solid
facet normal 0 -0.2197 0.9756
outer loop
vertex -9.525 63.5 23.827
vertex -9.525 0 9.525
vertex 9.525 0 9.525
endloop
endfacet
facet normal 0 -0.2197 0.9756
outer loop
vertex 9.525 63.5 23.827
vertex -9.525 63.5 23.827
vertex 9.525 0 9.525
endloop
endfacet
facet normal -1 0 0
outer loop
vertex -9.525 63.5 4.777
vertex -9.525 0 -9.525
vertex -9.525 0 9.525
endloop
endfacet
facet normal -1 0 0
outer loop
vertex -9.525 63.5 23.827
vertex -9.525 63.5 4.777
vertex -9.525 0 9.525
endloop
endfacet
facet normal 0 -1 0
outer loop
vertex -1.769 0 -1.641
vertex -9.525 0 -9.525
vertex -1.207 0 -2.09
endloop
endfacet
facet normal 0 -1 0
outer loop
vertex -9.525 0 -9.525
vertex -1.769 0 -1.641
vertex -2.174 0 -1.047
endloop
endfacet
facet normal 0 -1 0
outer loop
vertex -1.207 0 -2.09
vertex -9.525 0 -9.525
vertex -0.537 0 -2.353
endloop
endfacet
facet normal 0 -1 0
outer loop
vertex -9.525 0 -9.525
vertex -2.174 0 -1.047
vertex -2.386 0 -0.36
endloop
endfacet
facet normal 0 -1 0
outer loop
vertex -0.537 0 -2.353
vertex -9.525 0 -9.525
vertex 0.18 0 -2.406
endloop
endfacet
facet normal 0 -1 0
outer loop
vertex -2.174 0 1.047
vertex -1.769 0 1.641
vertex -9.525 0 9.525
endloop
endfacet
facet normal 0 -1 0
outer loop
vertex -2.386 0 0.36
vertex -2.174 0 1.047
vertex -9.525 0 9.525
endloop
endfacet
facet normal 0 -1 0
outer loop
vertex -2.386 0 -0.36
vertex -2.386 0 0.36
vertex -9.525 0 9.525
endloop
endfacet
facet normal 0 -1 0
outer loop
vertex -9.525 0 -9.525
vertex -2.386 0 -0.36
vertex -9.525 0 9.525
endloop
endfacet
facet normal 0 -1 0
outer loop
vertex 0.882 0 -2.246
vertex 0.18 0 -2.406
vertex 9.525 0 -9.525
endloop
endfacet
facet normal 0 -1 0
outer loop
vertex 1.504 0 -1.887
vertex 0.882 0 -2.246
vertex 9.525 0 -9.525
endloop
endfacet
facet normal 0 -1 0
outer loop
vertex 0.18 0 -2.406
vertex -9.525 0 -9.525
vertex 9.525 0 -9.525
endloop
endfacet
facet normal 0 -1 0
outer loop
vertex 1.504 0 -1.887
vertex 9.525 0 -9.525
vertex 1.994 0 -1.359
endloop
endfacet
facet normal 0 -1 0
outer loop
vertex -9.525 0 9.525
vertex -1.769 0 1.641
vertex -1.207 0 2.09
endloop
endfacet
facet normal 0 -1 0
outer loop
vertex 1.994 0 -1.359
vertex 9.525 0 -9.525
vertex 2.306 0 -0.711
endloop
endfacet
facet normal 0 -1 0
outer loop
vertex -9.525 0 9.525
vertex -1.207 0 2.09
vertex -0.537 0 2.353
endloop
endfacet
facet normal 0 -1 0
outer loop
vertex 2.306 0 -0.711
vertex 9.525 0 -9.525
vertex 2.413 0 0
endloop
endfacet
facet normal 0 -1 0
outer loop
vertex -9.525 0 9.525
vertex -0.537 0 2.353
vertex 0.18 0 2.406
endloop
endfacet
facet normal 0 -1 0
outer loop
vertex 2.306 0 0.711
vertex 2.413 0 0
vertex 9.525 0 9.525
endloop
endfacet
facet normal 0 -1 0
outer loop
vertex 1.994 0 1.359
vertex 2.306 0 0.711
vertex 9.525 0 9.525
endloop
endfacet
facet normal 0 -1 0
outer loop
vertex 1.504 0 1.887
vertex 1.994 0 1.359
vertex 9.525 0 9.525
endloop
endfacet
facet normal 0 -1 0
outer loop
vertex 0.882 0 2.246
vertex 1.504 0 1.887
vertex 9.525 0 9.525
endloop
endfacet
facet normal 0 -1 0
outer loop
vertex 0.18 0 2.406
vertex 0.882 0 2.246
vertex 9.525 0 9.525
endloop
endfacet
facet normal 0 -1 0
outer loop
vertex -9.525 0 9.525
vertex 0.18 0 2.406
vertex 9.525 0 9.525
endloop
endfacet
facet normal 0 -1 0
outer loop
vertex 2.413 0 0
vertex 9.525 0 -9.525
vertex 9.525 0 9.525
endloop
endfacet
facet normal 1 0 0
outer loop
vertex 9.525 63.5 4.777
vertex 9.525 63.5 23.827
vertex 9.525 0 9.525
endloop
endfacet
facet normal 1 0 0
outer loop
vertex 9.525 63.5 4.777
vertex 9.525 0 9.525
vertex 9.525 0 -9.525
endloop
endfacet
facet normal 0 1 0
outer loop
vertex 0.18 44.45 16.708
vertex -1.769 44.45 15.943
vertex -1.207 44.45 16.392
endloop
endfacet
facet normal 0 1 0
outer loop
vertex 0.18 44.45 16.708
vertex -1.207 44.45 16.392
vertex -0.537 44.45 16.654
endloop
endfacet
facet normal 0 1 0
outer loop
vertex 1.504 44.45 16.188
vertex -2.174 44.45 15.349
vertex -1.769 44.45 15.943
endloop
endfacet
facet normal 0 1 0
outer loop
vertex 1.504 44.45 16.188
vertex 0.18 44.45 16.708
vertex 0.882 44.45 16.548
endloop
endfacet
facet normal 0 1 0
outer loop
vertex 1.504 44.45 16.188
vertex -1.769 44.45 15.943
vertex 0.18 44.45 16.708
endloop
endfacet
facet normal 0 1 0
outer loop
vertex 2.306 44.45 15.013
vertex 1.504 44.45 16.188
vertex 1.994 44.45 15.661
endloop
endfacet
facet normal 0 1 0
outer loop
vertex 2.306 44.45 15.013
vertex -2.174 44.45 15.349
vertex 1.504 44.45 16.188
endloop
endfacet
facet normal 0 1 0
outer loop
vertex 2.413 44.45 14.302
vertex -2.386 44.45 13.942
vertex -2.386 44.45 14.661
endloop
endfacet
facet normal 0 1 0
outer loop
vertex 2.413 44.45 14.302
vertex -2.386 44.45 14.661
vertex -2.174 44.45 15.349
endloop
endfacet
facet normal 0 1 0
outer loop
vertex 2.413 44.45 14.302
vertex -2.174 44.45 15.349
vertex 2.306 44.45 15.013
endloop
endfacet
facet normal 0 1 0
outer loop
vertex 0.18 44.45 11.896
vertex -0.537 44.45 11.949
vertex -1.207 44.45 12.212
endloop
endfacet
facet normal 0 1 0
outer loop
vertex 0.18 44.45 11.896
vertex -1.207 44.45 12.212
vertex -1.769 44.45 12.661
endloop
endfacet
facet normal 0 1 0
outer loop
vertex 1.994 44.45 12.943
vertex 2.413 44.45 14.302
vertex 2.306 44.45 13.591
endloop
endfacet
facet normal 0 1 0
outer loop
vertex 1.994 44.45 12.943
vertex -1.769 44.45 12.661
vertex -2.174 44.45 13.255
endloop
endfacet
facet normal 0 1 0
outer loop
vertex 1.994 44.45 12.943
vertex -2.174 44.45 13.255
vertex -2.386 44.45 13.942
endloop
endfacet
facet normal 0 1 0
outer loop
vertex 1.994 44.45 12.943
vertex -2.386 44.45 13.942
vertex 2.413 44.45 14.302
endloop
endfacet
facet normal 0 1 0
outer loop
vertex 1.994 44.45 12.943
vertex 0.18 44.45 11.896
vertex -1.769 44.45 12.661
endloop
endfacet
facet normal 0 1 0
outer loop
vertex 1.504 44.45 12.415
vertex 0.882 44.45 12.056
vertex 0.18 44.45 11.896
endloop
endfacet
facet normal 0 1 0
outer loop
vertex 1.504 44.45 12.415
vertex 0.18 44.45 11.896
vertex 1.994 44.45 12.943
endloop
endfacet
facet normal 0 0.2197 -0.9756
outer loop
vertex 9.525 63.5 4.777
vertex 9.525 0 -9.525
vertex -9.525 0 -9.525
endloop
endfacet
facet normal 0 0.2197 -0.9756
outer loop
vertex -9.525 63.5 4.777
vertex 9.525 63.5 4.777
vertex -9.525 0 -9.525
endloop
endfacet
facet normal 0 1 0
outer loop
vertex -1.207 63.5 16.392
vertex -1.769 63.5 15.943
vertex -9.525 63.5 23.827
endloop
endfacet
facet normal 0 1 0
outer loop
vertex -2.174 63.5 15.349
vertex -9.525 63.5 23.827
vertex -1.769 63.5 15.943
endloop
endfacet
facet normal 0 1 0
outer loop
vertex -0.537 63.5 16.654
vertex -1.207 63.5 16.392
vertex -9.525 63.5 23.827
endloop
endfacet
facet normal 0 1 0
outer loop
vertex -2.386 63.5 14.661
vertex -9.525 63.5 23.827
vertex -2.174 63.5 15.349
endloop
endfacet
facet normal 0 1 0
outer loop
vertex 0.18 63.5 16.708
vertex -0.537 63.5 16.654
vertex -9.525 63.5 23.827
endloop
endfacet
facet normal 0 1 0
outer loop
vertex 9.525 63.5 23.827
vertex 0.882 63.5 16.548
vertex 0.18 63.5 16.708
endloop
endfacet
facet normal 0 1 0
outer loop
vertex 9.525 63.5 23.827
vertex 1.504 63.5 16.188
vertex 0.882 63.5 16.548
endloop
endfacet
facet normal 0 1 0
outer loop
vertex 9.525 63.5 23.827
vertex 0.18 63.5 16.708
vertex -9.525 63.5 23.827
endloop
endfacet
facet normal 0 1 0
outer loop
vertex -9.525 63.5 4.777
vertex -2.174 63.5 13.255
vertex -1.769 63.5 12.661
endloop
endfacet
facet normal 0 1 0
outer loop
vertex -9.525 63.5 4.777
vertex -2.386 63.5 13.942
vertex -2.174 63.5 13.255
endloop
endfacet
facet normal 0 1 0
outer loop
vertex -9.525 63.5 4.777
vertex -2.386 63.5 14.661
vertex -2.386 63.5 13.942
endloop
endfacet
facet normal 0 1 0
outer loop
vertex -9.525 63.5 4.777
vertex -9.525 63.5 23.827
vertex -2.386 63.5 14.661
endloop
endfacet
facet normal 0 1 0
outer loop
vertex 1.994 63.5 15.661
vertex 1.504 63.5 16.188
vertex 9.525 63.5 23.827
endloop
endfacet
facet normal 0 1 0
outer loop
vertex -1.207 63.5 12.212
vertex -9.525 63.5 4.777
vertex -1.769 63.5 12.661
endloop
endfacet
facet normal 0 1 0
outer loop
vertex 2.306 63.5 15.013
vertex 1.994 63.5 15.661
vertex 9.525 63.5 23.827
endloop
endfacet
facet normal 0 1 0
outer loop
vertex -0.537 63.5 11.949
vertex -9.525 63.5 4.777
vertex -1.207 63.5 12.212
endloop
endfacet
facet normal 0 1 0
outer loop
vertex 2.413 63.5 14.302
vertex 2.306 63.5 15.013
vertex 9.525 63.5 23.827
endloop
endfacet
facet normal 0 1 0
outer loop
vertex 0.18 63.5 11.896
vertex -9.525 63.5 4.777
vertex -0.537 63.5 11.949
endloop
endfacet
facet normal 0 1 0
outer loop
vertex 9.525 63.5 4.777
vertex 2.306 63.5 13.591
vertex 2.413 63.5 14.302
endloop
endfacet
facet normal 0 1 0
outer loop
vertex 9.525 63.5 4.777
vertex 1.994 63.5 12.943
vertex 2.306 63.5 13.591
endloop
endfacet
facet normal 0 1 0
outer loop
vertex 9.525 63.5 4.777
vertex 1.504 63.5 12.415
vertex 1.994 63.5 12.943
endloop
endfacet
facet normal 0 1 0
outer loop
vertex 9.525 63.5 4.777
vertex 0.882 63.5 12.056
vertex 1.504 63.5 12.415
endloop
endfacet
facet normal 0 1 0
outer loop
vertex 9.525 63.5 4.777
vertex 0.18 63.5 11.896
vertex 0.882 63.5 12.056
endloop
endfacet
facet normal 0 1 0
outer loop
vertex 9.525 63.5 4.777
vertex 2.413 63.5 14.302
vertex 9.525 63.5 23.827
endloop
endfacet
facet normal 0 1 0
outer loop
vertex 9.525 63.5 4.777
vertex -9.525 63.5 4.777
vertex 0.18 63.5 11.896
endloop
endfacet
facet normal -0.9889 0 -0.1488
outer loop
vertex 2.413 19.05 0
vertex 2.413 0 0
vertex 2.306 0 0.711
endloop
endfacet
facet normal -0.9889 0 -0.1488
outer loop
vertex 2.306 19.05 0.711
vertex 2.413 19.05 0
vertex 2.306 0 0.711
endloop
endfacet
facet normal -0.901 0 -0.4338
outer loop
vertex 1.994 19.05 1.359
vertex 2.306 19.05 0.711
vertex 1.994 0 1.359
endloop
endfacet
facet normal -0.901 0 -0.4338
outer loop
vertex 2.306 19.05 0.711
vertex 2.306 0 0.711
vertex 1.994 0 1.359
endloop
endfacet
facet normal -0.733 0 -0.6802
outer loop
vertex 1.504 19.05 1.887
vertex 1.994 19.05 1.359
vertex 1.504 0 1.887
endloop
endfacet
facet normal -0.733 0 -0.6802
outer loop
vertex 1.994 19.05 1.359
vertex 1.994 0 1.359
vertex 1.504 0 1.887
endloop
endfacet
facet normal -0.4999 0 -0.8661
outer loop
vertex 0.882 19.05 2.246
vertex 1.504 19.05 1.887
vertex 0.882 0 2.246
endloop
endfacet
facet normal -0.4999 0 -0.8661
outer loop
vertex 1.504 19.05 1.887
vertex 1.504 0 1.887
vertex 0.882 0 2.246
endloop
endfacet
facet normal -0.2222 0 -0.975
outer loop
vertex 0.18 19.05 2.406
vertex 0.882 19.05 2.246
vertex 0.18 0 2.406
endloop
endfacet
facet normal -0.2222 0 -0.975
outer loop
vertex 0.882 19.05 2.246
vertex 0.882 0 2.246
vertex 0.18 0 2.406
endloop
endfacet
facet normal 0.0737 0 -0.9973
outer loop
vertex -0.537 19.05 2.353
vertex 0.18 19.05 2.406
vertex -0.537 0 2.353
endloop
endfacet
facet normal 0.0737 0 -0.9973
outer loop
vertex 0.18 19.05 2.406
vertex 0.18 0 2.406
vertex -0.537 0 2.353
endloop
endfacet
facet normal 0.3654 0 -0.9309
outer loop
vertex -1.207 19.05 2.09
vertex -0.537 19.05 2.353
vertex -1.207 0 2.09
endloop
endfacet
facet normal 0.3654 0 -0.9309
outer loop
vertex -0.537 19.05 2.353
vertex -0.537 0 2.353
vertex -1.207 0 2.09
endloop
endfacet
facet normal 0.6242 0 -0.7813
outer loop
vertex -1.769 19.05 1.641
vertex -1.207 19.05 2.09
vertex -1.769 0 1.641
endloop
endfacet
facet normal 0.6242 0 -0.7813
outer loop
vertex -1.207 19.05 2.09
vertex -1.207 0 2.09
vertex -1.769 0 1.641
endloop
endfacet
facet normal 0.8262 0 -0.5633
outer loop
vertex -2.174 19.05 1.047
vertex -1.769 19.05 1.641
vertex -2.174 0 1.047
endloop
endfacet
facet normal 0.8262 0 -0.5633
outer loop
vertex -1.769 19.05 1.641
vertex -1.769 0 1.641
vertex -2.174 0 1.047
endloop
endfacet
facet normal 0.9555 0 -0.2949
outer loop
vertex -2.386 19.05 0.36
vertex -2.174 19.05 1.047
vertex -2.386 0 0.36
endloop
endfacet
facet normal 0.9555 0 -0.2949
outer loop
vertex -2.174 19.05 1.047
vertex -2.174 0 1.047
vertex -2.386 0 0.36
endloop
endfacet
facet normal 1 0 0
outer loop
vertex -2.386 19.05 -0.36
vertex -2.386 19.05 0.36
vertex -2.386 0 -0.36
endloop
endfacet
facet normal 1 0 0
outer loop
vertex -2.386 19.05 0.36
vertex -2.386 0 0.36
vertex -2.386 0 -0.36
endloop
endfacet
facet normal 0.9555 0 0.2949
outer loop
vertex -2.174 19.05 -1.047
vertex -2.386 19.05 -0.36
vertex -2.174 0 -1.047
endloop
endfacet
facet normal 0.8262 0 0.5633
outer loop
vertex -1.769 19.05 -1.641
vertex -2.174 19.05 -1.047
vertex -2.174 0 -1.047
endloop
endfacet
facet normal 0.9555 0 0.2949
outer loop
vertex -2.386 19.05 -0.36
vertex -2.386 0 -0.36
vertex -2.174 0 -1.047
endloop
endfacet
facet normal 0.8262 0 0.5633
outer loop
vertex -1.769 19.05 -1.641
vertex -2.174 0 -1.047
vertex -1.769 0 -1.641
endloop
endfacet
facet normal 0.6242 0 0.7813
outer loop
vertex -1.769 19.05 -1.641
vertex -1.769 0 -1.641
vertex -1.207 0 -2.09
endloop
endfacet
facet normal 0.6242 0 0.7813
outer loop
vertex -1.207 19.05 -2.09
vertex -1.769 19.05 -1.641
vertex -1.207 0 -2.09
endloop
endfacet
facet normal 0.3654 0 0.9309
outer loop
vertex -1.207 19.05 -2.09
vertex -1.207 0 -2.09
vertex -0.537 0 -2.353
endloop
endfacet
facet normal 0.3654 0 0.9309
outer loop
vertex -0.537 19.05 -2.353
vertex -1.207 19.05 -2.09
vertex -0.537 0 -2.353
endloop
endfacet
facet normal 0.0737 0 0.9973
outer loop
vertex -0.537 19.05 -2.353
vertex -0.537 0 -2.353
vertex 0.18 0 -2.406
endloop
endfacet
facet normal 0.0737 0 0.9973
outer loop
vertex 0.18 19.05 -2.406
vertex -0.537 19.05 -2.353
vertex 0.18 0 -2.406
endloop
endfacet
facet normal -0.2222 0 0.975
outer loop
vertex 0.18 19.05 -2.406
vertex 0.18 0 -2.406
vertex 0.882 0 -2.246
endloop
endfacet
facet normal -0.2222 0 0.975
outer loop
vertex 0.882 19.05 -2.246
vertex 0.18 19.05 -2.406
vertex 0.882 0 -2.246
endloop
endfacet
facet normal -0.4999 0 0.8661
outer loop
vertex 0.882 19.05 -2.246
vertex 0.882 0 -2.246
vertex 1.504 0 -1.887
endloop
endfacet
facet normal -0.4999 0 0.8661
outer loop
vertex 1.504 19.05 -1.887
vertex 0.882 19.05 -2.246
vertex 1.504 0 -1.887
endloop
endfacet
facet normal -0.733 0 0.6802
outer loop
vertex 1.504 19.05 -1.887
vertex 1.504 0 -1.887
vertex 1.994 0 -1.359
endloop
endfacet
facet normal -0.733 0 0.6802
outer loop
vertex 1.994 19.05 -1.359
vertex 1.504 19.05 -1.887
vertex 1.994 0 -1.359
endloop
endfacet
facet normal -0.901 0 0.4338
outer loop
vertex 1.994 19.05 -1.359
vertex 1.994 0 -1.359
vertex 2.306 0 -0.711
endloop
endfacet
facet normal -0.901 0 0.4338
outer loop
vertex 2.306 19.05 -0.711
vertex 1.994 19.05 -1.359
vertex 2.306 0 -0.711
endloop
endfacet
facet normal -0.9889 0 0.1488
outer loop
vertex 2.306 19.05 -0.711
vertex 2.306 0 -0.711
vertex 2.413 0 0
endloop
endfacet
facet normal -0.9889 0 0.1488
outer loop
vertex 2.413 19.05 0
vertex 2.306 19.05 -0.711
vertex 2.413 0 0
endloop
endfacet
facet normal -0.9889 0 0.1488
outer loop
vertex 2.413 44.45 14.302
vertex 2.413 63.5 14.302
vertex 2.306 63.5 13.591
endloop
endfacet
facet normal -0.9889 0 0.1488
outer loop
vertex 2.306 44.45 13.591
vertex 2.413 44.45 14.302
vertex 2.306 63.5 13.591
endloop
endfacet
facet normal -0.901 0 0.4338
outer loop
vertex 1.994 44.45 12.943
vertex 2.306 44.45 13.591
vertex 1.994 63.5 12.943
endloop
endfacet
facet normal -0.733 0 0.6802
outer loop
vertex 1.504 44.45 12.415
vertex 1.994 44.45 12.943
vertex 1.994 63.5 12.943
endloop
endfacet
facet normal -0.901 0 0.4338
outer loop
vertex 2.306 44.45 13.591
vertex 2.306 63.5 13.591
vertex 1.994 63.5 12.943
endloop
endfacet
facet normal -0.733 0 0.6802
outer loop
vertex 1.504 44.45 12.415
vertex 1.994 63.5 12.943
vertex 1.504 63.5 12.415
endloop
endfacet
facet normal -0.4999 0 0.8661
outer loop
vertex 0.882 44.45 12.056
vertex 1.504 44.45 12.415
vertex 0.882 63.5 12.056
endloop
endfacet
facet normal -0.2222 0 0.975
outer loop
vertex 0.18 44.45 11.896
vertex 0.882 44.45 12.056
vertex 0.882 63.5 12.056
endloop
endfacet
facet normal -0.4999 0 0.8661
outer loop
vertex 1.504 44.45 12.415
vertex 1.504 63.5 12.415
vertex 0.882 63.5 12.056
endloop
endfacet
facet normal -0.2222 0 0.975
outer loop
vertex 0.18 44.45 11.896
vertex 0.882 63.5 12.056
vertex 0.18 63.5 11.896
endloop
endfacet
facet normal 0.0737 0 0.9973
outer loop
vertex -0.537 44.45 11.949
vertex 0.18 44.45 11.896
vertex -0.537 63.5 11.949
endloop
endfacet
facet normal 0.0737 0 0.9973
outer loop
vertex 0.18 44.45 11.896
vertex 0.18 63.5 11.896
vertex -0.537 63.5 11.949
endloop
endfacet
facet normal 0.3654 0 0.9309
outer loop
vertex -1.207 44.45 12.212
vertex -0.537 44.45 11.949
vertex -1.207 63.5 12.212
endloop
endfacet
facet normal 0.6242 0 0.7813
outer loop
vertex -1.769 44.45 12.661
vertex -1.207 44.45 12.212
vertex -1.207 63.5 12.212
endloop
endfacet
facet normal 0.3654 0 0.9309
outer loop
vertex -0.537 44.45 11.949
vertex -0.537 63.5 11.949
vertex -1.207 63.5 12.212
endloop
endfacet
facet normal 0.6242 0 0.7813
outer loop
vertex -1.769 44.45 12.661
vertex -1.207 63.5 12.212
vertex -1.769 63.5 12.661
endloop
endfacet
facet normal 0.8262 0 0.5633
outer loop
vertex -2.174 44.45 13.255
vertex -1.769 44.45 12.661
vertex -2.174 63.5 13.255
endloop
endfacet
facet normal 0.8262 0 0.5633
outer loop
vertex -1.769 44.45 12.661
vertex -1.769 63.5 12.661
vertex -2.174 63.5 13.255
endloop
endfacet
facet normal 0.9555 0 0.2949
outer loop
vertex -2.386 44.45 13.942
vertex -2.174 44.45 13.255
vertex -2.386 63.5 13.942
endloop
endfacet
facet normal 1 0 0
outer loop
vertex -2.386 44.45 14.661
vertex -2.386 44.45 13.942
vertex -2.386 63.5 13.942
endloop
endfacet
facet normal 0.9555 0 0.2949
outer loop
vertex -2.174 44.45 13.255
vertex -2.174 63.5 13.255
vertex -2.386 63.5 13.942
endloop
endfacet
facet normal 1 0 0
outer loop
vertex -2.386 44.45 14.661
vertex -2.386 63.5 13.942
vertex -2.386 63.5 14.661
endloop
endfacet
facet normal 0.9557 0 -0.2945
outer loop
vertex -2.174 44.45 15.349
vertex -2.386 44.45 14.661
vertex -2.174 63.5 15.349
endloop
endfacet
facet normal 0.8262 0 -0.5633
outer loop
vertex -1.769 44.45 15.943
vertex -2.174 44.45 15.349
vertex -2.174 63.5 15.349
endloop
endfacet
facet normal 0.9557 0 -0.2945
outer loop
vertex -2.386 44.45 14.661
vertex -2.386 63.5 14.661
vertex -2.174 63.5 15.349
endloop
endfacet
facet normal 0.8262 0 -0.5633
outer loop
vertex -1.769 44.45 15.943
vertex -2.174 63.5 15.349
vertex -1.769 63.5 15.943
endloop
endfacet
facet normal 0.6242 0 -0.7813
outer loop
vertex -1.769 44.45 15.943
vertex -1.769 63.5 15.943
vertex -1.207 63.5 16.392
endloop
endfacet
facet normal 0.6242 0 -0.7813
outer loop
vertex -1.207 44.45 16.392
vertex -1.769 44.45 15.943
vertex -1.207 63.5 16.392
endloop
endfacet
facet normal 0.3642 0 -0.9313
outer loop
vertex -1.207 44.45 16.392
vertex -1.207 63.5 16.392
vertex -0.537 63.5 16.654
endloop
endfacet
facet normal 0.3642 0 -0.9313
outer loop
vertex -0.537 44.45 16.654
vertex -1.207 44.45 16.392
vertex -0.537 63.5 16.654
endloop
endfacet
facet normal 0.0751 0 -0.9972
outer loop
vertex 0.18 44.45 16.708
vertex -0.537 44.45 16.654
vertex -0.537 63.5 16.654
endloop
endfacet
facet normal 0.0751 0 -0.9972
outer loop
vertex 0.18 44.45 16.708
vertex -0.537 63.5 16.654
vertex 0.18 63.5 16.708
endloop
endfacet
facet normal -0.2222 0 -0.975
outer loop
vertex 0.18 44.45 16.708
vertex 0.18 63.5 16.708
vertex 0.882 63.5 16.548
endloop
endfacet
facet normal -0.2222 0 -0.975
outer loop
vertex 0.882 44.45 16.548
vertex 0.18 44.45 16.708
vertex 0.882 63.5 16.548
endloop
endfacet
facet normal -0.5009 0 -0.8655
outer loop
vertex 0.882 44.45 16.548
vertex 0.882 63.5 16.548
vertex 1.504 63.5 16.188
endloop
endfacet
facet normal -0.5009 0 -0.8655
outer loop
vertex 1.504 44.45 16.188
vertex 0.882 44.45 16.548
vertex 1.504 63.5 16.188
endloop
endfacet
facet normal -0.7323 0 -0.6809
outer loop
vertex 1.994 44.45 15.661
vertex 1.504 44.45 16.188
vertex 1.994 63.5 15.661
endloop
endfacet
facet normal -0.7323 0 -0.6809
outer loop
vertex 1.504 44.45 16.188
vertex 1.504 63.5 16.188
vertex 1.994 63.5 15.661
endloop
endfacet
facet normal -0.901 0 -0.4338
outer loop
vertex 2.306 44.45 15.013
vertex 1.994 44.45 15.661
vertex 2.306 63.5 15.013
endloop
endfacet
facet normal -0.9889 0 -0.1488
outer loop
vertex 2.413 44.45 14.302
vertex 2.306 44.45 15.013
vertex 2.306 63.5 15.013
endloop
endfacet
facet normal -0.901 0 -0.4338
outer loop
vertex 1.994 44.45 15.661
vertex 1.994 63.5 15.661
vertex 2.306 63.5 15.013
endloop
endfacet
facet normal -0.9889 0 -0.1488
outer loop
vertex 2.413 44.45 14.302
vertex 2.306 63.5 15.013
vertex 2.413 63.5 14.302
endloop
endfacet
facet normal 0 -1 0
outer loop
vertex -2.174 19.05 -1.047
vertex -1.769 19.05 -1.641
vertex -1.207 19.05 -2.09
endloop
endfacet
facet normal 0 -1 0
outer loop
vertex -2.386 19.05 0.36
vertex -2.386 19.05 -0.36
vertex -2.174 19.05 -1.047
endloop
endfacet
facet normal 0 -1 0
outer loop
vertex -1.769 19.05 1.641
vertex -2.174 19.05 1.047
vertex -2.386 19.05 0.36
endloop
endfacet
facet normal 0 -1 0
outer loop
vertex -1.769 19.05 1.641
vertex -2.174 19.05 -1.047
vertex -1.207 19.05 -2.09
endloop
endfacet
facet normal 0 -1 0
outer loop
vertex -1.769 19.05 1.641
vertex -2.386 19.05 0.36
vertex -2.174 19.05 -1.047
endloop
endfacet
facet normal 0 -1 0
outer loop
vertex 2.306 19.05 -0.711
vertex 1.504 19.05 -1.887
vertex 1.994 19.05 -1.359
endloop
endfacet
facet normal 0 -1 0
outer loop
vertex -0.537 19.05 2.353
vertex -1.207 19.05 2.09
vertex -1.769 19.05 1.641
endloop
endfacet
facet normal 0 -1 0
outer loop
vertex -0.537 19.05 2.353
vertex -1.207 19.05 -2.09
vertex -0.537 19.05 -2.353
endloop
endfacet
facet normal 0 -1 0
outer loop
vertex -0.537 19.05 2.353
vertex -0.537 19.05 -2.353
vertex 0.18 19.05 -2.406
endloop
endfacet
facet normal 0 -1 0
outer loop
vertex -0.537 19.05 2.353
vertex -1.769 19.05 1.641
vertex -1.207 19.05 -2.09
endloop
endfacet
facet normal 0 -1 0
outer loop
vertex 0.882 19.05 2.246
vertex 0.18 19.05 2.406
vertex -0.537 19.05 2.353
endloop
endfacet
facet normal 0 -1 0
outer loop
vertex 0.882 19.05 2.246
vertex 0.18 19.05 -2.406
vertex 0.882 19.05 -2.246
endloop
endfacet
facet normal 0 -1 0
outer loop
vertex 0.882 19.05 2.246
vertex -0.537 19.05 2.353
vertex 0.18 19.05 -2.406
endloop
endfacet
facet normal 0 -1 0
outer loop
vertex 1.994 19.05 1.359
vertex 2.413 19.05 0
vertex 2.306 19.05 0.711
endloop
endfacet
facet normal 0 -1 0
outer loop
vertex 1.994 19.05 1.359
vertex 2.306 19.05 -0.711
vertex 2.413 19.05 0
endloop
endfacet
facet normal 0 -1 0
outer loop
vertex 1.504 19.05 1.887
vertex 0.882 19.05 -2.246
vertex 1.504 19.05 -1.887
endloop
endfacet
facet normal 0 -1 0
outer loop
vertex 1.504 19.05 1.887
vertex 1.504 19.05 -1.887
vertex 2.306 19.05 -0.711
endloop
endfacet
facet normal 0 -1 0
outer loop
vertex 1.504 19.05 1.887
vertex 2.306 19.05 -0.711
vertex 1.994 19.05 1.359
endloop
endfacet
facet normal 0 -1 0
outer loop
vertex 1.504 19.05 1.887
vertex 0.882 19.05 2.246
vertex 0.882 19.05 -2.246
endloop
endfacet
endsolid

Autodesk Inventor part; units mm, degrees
ref_plane "YZ Plane" through (0, 0, 0) normal (1, 0, 0) x (0, 1, 0)
ref_plane "XZ Plane" through (0, 0, 0) normal (0, 1, 0) x (-1, 0, 0)
ref_plane "XY Plane" through (0, 0, 0) normal (0, 0, 1) x (1, 0, 0)
sketch "Sketch1" plane through (0, 0, 0) normal (0, 1, 0) x (-1, 0, 0)
  line L0 (-9.525, -9.525) -> (9.525, -9.525)
  line L1 (9.525, -9.525) -> (9.525, 9.525)
  line L2 (9.525, 9.525) -> (-9.525, 9.525)
  line L3 (-9.525, 9.525) -> (-9.525, -9.525)
  line L4 (-9.525, -9.525) -> (9.525, 9.525) construction
  line L5 (9.525, -9.525) -> (-9.525, 9.525) construction
  point P0 (0, 0)
  dimension "d0" = 19.05
  dimension "d1" = 19.05
sketch "Sketch2" plane through (0, 0, 0) normal (1, 0, 0) x (0, 1, 0)
  line L0 (0, 0) -> (112.776, 25.4)
  dimension "d2" = 112.776
  dimension "d3" = 25.4
sweep "Sweep1" add profiles "Sketch1" path "Sketch2"
sketch "Sketch3" plane through (-9.525, 112.776, 34.925) normal (0, 1, 0) x (1, 0, 0)
  line L0 (34.925, 76.2) -> (-15.875, 76.2)
  line L1 (-15.875, 76.2) -> (-15.875, -25.4)
  line L2 (-15.875, -25.4) -> (34.925, -25.4)
  line L3 (34.925, -25.4) -> (34.925, 76.2)
  line L4 (0, 25.4) -> (19.05, 25.4) projected
  line L5 (34.925, 76.2) -> (-15.875, -25.4) construction
  line L6 (-15.875, 76.2) -> (34.925, -25.4) construction
  point P0 (9.525, 34.925)
  point P1 (9.525, 25.4)
  dimension "d6" = 50.8
  dimension "d7" = 101.6
extrude "Extrusion1" cut sketch "Sketch3" against normal blind 49.276
sketch "Sketch4" plane through (-9.525, 0, -9.525) normal (0, -1, 0) x (1, 0, 0)
  circle A0 centre (9.525, 9.525) radius 2.413
  dimension "d10" = 4.826
extrude "Extrusion2" cut sketch "Sketch4" against normal blind 19.05
thread "Thread1"
sketch "Sketch5" plane through (-9.525, 63.5, 34.925) normal (0, 1, 0) x (1, 0, 0)
  circle A0 centre (9.525, 20.6232) radius 2.413
  line L0 (0, 11.0982) -> (0, 30.1482) projected
  line L1 (19.05, 11.0982) -> (0, 11.0982) projected
  point P0 (9.525, 34.925)
  point P1 (0, 20.6232)
  point P2 (9.525, 11.0982)
  dimension "d15" = 4.826
extrude "Extrusion3" cut sketch "Sketch5" against normal blind 19.05
properties part number "STRU_008_BilletBlock_Slanted"
